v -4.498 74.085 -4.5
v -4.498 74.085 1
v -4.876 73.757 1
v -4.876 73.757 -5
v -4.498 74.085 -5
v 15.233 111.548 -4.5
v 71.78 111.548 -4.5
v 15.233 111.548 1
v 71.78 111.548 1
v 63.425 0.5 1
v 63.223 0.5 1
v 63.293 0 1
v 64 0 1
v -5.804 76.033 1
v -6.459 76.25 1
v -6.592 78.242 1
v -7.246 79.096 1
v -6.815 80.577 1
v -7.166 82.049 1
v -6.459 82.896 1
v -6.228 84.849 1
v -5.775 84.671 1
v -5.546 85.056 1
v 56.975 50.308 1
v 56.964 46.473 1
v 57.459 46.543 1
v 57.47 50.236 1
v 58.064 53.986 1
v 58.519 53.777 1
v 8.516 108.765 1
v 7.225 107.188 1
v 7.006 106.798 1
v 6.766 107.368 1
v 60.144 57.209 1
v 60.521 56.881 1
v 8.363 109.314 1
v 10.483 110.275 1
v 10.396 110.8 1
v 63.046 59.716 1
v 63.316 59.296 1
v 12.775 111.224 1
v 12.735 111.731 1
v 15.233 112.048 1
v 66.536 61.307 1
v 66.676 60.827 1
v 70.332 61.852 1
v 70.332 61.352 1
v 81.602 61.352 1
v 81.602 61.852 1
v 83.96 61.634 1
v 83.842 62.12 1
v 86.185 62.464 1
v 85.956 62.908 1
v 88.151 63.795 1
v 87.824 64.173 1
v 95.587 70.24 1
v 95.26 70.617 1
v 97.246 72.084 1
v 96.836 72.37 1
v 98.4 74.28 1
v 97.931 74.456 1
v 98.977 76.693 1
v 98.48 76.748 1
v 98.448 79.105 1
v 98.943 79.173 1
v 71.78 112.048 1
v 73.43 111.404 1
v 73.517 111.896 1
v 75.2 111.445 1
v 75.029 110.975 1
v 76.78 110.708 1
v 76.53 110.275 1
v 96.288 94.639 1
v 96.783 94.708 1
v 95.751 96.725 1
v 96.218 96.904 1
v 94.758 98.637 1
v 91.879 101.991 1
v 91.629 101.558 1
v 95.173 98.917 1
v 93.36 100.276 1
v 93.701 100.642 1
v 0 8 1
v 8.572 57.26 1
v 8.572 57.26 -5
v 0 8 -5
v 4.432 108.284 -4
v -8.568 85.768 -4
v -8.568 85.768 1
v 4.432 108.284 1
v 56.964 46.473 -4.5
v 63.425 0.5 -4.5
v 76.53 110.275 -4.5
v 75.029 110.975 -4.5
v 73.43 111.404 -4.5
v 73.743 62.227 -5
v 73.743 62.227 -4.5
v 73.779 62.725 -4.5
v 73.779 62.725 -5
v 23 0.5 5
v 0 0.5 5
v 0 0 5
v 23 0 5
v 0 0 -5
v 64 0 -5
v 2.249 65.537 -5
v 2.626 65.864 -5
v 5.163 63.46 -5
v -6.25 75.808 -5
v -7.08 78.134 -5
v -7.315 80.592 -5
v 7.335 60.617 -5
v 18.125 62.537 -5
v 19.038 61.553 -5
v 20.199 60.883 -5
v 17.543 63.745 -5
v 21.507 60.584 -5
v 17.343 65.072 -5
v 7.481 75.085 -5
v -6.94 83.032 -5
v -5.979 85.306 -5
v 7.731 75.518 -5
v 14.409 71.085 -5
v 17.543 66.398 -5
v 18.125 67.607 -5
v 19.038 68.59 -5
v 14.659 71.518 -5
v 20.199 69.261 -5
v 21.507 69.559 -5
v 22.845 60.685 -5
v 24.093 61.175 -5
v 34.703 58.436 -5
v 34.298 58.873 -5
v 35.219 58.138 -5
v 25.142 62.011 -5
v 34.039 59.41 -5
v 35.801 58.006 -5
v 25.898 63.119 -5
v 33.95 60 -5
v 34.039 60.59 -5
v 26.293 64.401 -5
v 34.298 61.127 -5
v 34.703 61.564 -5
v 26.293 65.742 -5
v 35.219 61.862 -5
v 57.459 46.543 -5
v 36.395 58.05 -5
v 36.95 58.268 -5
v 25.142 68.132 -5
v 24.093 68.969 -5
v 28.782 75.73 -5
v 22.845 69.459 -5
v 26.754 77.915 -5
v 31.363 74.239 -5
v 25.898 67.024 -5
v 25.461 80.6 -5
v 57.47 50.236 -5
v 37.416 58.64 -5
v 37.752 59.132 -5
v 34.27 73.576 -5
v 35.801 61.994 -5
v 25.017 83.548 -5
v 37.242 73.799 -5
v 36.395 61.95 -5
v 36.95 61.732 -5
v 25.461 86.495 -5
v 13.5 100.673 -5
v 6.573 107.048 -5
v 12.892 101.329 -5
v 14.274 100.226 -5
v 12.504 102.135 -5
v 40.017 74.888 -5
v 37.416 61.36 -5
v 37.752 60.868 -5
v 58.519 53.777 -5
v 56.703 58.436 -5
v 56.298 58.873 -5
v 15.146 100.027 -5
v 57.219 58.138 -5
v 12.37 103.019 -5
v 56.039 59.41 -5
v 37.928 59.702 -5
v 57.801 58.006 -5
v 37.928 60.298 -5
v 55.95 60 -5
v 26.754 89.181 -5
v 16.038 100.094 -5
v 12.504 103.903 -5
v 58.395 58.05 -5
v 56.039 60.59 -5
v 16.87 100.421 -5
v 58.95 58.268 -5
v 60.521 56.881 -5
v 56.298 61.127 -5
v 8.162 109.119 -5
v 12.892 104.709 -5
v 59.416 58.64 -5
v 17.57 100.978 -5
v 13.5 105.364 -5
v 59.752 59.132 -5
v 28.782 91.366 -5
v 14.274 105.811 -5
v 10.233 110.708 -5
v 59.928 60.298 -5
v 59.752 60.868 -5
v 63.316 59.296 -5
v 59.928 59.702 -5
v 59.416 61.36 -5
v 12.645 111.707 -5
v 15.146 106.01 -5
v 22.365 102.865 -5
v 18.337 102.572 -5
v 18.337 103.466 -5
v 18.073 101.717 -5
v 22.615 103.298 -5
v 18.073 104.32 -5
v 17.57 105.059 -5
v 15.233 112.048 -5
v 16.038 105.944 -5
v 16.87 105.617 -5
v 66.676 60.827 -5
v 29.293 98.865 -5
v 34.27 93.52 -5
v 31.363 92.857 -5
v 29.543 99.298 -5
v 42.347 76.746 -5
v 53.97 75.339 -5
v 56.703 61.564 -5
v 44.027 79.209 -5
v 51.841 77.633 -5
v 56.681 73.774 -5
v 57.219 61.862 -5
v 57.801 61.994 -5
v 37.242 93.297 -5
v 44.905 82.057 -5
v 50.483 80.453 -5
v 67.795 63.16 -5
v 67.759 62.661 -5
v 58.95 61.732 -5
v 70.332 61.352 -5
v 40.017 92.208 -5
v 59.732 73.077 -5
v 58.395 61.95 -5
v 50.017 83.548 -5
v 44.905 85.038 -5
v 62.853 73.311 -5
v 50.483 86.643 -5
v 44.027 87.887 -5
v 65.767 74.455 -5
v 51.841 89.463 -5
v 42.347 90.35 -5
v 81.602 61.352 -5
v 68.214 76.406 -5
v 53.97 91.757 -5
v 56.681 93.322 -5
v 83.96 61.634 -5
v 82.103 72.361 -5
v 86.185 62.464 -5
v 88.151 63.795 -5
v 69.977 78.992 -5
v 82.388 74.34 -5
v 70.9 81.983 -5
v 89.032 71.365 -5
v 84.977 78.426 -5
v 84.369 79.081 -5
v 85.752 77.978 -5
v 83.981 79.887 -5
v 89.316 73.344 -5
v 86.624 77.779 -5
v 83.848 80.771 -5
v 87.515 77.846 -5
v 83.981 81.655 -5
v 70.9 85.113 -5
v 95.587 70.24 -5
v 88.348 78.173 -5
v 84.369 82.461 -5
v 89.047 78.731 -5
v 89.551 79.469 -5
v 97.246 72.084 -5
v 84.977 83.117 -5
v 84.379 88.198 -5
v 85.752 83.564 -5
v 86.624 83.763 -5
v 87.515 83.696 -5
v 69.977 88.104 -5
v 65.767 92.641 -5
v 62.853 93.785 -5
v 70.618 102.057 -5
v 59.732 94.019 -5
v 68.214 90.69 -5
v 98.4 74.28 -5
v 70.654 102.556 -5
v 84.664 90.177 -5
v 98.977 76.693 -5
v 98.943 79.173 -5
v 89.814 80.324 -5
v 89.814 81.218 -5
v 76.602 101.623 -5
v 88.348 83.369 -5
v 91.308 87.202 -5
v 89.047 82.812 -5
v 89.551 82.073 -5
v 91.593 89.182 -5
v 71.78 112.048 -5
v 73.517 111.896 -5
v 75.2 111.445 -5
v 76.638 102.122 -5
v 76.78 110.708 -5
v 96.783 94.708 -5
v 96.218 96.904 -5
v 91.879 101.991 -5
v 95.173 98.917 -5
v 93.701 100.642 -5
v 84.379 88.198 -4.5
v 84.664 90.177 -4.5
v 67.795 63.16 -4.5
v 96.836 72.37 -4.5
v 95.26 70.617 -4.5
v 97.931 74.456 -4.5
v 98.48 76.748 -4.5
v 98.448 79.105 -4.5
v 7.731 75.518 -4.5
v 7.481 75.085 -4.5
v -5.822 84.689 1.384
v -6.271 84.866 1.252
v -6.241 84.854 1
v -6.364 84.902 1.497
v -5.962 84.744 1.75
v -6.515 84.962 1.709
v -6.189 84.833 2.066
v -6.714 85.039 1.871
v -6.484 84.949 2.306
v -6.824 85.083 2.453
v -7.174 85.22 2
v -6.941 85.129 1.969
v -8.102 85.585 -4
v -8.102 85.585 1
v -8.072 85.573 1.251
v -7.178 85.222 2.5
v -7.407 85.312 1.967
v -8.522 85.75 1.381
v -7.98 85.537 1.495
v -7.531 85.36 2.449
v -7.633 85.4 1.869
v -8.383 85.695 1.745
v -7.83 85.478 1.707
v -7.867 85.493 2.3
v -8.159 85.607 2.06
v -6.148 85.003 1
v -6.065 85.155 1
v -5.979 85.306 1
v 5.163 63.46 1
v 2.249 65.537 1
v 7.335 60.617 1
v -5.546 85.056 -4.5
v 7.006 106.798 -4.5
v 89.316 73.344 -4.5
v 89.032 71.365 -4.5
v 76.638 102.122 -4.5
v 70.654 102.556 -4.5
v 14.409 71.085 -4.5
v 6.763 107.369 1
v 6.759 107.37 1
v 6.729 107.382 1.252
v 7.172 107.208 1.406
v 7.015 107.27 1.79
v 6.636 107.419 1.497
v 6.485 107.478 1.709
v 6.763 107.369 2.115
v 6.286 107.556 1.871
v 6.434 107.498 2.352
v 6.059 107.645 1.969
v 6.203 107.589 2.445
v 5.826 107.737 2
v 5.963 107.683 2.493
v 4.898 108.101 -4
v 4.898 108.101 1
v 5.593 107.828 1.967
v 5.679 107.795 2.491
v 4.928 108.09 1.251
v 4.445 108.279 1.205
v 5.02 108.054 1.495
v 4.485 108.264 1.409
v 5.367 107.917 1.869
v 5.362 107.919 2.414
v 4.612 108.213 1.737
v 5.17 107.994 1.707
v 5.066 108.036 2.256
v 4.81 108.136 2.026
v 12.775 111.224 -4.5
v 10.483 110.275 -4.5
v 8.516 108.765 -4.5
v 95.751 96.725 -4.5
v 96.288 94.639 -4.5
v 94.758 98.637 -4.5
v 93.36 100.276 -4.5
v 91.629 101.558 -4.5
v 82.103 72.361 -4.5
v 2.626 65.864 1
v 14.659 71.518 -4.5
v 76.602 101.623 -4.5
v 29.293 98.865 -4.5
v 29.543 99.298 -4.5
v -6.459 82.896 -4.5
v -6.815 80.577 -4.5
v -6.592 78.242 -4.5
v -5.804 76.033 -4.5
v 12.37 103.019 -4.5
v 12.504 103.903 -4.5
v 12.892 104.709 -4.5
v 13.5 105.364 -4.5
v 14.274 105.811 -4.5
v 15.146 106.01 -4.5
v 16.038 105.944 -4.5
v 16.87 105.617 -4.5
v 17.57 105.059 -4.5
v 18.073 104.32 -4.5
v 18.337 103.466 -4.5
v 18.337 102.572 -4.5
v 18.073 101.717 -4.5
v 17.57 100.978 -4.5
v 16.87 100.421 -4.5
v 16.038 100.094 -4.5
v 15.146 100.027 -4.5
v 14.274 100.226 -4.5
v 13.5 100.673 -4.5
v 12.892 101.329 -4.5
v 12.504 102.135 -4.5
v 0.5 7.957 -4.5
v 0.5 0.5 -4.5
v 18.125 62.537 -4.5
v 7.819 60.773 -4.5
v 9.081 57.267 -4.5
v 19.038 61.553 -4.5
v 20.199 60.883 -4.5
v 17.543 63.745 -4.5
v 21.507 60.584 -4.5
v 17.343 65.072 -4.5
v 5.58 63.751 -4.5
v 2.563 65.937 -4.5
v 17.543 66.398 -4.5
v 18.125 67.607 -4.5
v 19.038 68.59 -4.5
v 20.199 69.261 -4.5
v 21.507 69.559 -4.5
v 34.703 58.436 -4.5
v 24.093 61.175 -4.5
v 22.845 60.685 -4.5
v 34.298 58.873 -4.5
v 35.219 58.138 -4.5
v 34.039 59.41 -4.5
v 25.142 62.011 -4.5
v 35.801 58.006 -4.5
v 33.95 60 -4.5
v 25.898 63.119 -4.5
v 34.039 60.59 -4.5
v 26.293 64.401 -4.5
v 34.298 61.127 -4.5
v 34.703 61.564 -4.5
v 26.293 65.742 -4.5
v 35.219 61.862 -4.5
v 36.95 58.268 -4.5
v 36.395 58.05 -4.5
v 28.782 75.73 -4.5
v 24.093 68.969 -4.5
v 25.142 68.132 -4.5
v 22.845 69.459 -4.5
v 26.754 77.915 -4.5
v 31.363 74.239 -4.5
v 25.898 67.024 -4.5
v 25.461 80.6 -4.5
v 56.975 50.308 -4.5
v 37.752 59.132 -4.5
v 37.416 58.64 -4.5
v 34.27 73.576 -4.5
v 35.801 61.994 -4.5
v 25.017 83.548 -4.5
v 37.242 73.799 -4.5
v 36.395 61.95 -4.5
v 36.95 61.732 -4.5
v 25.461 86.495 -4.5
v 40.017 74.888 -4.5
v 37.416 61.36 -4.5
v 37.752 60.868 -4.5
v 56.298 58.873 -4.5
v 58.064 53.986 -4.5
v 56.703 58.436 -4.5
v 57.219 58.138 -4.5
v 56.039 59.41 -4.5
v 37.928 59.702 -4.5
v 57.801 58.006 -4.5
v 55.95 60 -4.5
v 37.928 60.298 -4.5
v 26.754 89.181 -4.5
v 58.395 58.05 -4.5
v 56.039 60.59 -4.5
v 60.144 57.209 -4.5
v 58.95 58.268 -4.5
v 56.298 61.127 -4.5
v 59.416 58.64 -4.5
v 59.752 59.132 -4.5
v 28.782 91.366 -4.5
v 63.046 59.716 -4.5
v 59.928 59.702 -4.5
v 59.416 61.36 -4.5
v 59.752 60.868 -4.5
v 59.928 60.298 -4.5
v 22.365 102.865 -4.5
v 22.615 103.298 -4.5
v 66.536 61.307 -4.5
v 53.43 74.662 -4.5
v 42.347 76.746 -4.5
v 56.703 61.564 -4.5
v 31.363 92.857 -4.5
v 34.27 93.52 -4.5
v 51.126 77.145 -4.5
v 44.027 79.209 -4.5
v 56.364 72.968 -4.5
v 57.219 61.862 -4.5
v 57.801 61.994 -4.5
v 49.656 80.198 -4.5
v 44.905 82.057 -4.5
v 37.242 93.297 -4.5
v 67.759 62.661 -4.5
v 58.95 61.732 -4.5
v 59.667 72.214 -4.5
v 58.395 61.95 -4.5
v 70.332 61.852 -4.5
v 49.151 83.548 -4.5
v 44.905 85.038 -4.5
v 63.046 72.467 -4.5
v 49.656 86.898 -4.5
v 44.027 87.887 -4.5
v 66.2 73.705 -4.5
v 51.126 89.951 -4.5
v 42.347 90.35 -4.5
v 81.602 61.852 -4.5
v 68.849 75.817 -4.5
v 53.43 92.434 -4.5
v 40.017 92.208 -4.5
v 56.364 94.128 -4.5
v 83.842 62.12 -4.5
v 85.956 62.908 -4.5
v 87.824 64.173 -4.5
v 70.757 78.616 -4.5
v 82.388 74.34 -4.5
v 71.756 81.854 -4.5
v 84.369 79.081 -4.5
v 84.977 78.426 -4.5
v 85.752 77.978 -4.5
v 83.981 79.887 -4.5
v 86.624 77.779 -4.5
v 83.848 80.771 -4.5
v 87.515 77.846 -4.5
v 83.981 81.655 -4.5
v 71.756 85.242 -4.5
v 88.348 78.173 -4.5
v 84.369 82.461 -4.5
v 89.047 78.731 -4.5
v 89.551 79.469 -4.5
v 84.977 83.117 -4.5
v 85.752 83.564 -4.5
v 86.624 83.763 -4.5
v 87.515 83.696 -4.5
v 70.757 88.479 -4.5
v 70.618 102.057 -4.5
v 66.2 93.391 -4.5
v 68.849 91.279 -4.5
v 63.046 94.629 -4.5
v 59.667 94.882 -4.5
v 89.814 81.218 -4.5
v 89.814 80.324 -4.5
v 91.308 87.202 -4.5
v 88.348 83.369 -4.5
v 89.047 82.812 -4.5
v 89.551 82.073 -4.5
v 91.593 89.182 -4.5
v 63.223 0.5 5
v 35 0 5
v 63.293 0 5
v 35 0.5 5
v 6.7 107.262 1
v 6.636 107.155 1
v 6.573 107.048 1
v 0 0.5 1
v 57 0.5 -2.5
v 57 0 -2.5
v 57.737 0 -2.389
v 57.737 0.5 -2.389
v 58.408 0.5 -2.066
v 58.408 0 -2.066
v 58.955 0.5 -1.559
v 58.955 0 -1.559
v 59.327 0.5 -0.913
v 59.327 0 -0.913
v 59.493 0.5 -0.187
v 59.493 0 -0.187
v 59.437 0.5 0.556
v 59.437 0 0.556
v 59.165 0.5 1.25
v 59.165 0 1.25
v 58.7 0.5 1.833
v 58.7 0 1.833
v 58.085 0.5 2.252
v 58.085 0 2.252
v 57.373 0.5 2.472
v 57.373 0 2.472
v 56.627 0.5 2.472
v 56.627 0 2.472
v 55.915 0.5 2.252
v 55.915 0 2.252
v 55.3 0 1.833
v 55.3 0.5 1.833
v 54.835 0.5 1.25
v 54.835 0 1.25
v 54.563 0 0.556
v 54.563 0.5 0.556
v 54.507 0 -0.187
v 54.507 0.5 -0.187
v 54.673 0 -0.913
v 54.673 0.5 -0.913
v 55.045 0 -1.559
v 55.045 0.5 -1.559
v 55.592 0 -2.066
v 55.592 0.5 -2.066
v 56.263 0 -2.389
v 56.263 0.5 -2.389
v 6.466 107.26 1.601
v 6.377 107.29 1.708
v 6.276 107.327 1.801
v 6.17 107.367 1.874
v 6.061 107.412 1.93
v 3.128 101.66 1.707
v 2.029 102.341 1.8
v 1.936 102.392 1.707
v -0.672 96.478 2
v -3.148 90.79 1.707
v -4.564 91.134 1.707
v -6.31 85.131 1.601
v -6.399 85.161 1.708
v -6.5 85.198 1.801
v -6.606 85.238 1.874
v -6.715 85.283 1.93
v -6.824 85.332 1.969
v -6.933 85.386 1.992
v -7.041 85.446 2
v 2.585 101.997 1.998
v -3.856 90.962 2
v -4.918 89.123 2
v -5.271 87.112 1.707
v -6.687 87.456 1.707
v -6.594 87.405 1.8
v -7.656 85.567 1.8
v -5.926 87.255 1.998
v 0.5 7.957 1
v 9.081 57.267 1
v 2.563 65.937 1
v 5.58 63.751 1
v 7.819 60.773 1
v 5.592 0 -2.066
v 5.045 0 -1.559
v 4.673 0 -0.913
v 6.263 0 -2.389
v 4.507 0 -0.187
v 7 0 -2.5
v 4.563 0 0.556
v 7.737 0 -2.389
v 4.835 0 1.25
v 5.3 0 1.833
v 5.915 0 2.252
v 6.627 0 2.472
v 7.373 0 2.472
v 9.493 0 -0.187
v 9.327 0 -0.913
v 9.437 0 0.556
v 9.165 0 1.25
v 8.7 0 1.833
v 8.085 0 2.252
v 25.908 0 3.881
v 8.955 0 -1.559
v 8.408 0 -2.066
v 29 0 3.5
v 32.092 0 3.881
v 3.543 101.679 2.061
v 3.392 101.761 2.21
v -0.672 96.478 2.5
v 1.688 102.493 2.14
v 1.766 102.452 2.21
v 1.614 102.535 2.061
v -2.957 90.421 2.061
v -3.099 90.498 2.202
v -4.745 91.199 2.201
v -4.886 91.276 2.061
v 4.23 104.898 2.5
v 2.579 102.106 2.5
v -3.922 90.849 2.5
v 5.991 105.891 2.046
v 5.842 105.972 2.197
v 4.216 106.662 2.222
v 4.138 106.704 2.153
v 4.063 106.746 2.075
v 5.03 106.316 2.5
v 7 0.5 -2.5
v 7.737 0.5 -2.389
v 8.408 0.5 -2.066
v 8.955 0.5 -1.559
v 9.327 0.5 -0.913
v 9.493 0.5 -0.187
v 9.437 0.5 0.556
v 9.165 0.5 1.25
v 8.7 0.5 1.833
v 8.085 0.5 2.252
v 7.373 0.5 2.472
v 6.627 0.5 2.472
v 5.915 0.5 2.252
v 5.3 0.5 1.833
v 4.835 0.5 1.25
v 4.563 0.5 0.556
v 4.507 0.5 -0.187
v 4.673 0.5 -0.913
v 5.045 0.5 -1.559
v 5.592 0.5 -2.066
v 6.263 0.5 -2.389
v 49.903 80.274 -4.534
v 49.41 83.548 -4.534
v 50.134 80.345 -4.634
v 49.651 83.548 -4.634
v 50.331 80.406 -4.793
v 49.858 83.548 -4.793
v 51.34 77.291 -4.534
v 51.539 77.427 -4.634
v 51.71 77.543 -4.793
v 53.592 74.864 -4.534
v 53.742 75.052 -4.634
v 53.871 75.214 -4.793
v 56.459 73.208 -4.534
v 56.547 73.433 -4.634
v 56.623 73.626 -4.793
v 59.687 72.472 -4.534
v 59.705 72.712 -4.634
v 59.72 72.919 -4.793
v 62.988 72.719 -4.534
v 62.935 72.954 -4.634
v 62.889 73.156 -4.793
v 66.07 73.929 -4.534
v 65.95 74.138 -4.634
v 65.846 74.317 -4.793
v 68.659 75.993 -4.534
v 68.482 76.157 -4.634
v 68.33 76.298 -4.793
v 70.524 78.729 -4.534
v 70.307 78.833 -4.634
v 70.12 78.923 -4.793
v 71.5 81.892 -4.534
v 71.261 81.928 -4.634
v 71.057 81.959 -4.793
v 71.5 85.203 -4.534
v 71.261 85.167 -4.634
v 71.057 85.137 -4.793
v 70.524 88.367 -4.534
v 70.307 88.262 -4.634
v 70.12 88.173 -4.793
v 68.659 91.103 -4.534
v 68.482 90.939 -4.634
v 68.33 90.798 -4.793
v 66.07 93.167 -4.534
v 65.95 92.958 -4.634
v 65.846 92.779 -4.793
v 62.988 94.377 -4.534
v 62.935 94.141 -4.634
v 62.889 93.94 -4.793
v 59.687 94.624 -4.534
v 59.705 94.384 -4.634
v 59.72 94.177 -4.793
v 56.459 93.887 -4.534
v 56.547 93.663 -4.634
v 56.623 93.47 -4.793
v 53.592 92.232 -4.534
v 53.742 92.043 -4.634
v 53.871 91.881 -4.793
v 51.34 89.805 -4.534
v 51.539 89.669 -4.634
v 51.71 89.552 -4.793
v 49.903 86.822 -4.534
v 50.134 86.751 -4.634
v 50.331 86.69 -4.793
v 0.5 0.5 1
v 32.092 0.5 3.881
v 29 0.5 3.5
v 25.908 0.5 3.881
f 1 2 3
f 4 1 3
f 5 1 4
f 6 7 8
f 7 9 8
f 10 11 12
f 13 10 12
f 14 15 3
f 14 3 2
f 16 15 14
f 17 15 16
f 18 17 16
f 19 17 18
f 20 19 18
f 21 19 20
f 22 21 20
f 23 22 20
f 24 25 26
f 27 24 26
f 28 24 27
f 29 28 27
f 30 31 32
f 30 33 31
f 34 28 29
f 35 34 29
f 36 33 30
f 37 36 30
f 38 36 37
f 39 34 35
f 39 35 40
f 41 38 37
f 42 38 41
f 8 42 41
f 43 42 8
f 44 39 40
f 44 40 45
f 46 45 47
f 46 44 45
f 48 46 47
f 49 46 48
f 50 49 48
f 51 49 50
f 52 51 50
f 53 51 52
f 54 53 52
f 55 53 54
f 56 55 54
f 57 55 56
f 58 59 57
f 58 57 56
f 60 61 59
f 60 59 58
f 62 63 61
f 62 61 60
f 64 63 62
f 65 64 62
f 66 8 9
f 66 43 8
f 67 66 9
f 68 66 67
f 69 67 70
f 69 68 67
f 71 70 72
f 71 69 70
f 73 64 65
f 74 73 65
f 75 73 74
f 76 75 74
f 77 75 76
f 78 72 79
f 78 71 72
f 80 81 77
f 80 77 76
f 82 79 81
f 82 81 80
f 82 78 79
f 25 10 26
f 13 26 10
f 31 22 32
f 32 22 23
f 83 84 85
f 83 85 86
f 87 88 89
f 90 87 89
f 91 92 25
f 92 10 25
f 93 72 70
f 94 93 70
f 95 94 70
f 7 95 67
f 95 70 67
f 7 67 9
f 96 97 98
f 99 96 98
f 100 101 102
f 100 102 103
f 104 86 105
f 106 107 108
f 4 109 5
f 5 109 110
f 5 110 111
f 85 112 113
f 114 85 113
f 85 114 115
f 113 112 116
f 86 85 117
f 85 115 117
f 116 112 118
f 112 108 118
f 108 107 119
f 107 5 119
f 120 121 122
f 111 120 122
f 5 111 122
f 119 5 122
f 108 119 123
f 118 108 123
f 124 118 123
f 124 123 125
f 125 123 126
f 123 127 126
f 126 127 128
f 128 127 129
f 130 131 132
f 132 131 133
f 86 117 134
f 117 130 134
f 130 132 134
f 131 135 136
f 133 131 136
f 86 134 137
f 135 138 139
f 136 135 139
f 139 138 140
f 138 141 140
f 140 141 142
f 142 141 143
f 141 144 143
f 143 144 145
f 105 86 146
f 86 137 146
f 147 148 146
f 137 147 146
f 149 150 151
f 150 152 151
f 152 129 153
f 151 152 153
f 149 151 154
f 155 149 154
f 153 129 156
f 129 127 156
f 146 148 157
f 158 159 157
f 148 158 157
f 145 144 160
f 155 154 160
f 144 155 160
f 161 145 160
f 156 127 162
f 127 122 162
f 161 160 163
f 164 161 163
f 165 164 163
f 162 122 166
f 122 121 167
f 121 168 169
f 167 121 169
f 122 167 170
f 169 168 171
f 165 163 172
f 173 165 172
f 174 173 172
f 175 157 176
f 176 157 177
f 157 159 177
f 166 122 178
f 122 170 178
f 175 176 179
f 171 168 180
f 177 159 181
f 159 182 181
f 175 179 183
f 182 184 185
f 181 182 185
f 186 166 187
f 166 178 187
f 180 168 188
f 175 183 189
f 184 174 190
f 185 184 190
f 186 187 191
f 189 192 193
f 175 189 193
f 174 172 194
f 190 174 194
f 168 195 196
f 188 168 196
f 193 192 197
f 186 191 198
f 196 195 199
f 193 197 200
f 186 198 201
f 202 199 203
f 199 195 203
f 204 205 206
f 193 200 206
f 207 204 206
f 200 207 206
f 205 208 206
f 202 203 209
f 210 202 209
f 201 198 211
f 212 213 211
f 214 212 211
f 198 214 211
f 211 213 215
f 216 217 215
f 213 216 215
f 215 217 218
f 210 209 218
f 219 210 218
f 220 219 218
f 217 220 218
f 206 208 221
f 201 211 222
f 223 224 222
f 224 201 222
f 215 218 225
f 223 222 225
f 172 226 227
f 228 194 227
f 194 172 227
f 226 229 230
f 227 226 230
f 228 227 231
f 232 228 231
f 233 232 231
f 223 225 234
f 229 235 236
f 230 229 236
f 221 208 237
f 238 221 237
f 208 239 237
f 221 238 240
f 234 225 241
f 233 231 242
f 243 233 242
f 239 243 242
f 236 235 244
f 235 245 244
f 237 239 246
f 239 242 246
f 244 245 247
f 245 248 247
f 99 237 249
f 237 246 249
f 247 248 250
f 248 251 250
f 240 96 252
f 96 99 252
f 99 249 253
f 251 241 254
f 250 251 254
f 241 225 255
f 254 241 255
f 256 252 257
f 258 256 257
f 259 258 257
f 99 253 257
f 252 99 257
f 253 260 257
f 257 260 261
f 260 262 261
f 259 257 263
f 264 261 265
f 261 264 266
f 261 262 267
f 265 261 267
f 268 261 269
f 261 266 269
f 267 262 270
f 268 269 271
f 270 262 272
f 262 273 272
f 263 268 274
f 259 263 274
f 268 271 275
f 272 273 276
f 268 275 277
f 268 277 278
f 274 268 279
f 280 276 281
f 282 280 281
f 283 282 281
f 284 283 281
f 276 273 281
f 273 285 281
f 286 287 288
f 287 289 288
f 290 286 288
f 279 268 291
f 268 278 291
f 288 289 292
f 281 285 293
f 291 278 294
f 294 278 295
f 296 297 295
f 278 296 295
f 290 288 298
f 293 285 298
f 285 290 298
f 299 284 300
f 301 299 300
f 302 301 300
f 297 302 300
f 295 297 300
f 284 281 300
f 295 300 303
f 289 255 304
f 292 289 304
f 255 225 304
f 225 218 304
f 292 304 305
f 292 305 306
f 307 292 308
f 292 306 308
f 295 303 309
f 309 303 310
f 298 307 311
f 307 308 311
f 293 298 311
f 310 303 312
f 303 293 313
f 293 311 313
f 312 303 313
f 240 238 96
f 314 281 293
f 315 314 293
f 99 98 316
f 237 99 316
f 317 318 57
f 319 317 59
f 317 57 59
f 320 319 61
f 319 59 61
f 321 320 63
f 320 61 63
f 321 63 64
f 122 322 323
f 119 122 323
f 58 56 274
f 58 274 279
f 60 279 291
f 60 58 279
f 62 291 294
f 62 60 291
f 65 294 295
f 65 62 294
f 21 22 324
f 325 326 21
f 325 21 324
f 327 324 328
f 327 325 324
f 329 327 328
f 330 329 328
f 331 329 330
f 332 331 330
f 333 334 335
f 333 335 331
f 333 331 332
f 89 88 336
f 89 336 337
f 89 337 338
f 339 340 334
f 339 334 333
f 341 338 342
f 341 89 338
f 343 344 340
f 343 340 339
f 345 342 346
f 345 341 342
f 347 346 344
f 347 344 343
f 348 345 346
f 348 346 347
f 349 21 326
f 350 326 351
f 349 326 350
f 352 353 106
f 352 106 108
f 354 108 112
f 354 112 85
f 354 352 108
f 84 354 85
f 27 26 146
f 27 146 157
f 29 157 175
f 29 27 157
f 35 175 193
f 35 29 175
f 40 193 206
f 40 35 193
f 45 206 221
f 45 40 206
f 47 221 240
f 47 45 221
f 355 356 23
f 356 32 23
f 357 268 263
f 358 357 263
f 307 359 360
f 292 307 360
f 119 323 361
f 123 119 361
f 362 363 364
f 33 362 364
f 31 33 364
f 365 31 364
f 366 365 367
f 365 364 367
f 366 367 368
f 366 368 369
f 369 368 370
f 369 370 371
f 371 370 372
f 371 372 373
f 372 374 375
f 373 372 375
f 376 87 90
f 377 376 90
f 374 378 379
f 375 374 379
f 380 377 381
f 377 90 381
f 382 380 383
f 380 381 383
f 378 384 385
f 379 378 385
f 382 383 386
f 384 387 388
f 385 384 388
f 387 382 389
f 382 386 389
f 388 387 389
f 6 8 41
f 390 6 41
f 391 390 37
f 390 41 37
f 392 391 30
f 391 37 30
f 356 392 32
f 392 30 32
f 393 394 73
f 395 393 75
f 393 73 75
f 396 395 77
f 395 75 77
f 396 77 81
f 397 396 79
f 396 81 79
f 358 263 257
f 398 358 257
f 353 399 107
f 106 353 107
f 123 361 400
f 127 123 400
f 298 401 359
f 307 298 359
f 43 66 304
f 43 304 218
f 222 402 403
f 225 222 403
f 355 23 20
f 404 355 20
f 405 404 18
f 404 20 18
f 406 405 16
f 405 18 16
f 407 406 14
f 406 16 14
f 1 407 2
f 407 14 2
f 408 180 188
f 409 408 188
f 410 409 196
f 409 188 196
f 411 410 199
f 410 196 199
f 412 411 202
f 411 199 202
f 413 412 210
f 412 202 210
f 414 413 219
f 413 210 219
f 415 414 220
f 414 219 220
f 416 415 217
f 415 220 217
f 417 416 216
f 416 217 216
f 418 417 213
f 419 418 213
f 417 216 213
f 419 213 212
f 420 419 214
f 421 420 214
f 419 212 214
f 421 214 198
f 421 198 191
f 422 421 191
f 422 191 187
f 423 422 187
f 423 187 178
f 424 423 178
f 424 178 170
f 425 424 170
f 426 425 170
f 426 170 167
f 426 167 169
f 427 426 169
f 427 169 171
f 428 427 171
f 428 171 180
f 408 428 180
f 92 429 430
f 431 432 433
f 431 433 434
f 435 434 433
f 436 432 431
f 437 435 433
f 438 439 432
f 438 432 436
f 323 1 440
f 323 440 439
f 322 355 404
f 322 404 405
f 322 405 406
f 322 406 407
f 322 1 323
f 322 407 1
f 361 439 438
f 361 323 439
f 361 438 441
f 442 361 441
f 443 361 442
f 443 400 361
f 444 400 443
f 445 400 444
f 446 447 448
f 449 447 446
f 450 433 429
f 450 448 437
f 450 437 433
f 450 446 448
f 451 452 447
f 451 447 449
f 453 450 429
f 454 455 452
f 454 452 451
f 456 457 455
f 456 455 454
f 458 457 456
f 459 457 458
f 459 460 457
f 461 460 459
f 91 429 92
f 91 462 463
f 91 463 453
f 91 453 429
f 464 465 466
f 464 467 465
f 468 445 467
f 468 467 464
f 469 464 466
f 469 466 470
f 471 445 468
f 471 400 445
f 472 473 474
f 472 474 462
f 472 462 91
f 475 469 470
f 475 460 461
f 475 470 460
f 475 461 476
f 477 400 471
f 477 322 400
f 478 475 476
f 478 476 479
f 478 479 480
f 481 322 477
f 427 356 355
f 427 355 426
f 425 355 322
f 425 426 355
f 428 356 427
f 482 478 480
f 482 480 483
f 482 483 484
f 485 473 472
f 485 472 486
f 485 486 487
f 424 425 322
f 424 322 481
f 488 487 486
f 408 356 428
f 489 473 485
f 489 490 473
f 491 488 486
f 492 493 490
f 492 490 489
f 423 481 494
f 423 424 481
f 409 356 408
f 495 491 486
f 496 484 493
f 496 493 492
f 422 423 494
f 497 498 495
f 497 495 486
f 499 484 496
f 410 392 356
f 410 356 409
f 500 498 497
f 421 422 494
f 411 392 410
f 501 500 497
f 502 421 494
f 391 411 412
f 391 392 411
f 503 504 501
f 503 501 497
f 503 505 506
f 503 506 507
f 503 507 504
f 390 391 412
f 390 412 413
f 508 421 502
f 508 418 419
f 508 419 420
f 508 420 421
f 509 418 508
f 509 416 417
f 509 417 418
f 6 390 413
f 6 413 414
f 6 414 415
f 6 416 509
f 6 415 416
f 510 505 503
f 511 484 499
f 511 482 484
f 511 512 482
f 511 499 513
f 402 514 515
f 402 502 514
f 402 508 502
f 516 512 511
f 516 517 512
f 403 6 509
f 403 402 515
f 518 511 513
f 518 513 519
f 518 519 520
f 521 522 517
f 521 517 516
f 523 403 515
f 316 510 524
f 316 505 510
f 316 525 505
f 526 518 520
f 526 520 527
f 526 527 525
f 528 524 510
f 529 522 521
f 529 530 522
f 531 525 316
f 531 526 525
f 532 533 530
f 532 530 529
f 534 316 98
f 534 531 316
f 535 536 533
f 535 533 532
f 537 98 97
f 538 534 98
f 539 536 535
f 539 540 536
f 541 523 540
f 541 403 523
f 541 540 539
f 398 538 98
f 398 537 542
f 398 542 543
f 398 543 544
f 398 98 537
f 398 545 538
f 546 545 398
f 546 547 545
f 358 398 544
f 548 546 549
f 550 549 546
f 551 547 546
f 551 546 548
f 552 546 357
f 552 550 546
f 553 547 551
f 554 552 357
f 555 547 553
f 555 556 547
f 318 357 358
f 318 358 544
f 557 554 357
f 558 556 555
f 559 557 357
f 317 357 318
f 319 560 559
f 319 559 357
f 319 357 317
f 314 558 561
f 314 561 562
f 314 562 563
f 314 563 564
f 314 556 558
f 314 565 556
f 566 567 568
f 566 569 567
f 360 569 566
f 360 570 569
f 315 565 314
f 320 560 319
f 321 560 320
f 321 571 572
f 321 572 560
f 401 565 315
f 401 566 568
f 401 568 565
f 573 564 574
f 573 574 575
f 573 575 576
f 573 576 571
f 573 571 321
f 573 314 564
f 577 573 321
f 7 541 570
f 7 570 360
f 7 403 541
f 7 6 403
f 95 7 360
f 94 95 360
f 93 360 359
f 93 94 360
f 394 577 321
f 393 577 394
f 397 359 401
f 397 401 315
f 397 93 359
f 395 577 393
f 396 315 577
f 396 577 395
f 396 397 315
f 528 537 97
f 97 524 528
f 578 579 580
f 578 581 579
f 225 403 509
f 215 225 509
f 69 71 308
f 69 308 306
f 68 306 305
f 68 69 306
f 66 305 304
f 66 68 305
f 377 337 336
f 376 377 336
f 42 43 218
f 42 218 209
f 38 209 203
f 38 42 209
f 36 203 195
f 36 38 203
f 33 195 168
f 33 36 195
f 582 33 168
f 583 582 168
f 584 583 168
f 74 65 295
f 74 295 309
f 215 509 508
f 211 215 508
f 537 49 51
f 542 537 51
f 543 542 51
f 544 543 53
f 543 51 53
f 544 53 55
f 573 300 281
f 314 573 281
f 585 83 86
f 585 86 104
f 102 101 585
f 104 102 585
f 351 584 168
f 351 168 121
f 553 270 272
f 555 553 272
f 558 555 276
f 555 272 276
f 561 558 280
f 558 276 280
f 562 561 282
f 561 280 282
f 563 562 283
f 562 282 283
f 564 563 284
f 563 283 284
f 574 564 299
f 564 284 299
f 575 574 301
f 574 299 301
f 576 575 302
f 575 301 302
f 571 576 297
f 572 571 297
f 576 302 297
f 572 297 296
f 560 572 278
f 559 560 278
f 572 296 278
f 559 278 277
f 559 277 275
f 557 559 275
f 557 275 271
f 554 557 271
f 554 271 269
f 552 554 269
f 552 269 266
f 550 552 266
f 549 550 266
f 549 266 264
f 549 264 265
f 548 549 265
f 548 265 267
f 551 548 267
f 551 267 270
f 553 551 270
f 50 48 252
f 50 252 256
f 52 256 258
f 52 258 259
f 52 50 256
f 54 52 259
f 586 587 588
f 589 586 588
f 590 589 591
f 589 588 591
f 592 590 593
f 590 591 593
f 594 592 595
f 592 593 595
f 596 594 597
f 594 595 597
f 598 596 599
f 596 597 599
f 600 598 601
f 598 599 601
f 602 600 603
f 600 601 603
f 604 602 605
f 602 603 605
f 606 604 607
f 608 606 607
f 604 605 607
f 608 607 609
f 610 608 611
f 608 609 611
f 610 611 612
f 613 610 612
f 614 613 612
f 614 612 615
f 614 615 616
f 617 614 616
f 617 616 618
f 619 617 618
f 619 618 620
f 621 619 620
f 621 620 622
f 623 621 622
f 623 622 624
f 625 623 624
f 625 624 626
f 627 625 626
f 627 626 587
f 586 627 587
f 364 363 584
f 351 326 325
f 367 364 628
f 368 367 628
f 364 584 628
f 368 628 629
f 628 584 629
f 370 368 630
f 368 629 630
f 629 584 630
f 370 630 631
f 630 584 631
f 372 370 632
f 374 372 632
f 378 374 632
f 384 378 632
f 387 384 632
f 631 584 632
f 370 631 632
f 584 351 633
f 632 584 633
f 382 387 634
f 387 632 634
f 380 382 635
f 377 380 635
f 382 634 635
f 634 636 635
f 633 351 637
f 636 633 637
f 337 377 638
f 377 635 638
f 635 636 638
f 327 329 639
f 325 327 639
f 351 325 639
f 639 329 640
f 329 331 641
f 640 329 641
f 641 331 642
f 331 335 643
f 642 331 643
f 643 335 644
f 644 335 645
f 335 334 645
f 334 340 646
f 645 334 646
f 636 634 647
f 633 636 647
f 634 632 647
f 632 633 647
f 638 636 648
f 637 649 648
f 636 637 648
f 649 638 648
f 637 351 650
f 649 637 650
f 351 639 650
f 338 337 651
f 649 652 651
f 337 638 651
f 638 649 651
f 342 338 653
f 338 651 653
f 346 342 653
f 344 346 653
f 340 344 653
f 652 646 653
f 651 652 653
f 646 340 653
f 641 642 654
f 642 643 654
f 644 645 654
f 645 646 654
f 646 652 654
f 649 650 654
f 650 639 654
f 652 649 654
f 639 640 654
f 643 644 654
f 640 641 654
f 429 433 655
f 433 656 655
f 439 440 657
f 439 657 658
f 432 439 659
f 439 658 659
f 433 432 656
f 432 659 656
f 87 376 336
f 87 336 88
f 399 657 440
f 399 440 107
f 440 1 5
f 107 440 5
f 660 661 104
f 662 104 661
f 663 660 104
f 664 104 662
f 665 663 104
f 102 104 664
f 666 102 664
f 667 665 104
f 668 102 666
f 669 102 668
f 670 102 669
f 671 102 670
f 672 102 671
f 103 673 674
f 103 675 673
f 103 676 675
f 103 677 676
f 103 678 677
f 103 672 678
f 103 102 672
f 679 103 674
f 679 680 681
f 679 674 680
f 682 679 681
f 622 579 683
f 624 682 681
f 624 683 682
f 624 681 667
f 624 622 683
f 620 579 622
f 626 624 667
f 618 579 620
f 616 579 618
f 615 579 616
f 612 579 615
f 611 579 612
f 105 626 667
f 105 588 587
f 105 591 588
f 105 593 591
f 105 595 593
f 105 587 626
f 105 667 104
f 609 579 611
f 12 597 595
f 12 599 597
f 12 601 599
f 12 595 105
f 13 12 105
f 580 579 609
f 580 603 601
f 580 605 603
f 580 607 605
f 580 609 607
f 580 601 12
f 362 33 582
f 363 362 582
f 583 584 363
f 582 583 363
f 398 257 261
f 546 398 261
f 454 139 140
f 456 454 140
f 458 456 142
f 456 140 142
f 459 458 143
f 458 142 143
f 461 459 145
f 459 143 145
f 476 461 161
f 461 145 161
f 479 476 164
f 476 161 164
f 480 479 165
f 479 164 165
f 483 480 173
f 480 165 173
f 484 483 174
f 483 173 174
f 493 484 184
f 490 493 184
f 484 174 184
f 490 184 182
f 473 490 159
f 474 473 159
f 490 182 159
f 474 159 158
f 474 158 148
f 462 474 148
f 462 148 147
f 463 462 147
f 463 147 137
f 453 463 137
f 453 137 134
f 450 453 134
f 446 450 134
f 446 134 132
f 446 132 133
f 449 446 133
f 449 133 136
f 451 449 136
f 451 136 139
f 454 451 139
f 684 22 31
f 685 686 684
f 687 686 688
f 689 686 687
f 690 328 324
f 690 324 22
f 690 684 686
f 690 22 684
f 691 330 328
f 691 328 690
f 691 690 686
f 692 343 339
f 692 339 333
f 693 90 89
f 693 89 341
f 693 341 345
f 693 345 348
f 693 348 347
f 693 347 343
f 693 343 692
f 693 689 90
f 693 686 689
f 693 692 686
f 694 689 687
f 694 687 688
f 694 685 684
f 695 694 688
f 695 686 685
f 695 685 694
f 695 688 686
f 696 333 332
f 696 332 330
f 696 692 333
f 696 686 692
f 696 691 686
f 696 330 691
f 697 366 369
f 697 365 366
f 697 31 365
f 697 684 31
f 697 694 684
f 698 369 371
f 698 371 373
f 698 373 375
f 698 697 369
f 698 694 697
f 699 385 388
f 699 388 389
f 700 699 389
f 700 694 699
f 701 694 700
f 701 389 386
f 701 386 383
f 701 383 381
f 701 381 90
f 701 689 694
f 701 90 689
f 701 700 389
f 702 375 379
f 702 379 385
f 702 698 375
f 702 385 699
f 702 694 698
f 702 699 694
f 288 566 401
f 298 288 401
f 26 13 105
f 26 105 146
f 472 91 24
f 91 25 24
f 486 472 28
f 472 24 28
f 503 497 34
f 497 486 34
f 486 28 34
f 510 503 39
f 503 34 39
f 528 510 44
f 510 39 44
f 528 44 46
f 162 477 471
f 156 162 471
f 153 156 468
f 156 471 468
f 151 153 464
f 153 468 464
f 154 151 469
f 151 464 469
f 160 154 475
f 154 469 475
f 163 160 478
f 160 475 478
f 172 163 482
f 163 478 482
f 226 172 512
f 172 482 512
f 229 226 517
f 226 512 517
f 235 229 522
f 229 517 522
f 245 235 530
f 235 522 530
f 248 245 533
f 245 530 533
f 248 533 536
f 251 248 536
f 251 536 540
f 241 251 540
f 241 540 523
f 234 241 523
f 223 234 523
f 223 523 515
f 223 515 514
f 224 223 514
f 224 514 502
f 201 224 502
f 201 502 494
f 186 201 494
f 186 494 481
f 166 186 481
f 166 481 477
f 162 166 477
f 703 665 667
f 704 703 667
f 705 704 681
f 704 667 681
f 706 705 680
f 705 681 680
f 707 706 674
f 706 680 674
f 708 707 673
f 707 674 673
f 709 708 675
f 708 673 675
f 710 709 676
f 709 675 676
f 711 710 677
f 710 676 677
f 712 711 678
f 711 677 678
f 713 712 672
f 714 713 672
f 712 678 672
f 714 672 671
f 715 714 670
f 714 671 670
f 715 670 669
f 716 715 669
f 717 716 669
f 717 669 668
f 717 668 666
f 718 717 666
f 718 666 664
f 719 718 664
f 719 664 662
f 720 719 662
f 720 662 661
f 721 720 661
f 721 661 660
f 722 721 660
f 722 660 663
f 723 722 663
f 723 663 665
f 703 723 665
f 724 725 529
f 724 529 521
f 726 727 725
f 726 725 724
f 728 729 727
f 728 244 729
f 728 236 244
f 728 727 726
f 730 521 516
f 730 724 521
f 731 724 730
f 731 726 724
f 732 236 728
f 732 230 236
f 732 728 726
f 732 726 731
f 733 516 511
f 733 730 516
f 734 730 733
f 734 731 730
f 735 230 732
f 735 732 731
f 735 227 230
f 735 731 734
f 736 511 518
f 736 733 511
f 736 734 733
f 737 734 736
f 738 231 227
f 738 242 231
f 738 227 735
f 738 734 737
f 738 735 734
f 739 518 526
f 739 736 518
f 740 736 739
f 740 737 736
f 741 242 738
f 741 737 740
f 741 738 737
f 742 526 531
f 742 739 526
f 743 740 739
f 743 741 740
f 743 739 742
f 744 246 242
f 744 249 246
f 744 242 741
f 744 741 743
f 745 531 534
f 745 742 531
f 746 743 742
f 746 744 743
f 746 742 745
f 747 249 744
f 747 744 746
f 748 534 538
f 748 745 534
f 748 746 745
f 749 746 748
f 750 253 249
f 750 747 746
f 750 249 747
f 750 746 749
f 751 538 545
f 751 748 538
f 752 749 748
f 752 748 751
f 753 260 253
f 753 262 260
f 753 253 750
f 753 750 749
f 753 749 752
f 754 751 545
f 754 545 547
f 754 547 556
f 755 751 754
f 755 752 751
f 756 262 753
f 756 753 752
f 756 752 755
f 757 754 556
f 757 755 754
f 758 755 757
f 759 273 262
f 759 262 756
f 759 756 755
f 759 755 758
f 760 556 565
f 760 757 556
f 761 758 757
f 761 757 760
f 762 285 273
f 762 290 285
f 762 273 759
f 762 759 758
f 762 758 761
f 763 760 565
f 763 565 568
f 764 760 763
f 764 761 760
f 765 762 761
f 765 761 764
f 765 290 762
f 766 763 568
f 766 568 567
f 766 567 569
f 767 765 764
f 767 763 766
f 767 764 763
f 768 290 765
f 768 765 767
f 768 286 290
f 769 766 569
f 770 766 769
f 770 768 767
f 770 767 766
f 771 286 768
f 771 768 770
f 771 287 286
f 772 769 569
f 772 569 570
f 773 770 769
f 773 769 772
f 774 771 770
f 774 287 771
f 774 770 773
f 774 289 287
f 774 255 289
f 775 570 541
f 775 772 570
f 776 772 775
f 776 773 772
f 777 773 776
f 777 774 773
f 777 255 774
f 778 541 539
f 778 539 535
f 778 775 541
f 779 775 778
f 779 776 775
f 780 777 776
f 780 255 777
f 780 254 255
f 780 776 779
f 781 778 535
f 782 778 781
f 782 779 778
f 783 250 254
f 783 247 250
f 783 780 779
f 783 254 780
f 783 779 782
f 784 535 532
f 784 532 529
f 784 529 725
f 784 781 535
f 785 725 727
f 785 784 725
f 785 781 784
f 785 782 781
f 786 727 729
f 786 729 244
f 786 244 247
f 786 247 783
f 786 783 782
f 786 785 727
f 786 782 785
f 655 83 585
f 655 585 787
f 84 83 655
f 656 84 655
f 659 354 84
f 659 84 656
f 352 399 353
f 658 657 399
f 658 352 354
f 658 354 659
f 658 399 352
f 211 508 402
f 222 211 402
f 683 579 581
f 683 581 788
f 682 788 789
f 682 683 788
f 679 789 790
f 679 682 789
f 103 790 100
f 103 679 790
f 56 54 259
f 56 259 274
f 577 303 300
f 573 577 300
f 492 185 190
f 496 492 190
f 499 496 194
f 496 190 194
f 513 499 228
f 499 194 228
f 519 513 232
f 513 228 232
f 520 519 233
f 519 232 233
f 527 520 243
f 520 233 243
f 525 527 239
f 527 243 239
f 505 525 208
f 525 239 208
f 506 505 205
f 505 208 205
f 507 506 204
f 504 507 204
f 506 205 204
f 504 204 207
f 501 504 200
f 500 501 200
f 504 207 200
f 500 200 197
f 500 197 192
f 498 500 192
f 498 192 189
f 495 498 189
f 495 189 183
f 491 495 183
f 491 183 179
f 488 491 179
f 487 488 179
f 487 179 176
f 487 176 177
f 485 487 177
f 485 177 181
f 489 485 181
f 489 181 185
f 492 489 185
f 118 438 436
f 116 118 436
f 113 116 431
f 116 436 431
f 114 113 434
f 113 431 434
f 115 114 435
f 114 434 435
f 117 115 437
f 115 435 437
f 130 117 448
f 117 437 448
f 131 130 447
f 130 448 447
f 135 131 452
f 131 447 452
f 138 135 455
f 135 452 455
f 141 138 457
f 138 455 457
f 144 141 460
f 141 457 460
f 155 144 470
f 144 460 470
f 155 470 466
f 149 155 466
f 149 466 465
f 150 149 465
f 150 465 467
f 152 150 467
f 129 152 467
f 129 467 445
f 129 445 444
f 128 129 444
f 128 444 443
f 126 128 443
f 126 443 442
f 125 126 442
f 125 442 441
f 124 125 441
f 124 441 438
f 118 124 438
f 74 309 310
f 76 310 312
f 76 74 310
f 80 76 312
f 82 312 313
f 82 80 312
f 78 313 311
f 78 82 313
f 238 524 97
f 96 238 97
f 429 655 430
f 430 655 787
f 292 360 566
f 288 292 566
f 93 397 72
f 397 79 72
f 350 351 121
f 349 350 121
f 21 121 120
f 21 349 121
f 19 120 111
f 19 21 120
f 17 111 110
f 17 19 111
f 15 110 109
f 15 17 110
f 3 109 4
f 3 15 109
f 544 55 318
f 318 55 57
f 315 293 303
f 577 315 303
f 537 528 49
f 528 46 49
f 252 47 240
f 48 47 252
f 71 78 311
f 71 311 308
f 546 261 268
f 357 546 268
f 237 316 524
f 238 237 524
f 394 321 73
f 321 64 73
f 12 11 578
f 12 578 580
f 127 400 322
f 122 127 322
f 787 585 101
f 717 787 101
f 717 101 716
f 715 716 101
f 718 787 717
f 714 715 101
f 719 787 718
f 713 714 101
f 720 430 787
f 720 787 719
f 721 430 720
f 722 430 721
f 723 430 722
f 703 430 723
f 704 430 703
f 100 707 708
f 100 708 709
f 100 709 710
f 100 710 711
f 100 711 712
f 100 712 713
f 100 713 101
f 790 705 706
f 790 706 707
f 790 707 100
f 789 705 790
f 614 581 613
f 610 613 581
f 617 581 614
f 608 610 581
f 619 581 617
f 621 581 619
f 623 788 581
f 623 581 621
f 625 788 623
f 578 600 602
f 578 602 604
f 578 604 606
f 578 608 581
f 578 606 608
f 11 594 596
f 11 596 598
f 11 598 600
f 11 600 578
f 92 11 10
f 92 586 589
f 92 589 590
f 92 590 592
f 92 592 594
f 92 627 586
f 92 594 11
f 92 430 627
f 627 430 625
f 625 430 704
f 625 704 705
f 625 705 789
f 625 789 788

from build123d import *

# Parameters (mm, degrees)
BOSS_EXTRUDE1_DEPTH         = 5
SHELL1_T                    = -0.5
SKETCH4_R                   = 2.5
CUT_EXTRUDE4_DEPTH          = 10
CUT_SWEEP2_START            = 1
CUT_SWEEP2_DEPTH            = 4
SKETCH8_W                   = 6
SKETCH8_H                   = 10.878336181
CUT_EXTRUDE6_DEPTH          = 10
SKETCH11_R                  = 4.5
SKETCH11_R_2                = 10.5
SKETCH11_R_3                = 10
CUT_EXTRUDE7_DEPTH          = 150.877510373
FILLET1_R                   = 1
BOSS_EXTRUDE6_START         = 69.993050043
BOSS_EXTRUDE6_DEPTH         = 26.446393474
BOSS_EXTRUDE6_START_2       = -40
BOSS_EXTRUDE6_2_OUTLINE_W   = 1.69894254
BOSS_EXTRUDE6_2_OUTLINE_H   = 3
BOSS_EXTRUDE6_2_OUTLINE_W_2 = 1.590498846
BOSS_EXTRUDE6_2_OUTLINE_H_2 = 10
BOSS_EXTRUDE6_2_DEPTH       = 7.043773978
BOSS_EXTRUDE6_3_OUTLINE_W   = 1.69894254
BOSS_EXTRUDE6_3_OUTLINE_H   = 7
BOSS_EXTRUDE6_3_DEPTH       = 3.122658049
BOSS_EXTRUDE6_START_3       = -33.015543653
BOSS_EXTRUDE6_4_OUTLINE_W   = 1.590498846
BOSS_EXTRUDE6_4_OUTLINE_H   = 3
BOSS_EXTRUDE6_4_DEPTH       = 2.015543653
SKETCH17_R                  = 3
CUT_EXTRUDE8_DEPTH          = 10
CUT_EXTRUDE9_DEPTH          = 10
SKETCH19_R                  = 2
CUT_EXTRUDE10_DEPTH         = 150.877510373
CUT_EXTRUDE11_DEPTH         = 10


with BuildPart() as part:
    # Sketch1 → Boss-Extrude1 (new, symmetric)
    with BuildSketch(Plane.XY):
        with BuildLine():
            Line((0, 0), (64, 0))
            Line((64, 0), (57.458864255, 46.542599231))
            ThreePointArc((57.458864255, 46.542599231), (60.521124606, 56.88061692), (70.332349149, 61.351849543))
            Line((70.332349149, 61.351849543), (81.602015886, 61.351849543))
            ThreePointArc((81.602015886, 61.351849543), (85.0970904, 61.9825137), (88.15132127, 63.794958715))
            Line((88.15132127, 63.794958715), (95.587384775, 70.239547086))
            ThreePointArc((95.587384775, 70.239547086), (98.399557697, 74.280371374), (98.942828678, 79.173369852))
            Line((98.942828678, 79.173369852), (96.783267224, 94.707844854))
            ThreePointArc((96.783267224, 94.707844854), (95.173069343, 98.916646259), (91.878517937, 101.991166954))
            Line((91.878517937, 101.991166954), (76.780291664, 110.708131957))
            ThreePointArc((76.780291664, 110.708131957), (74.368482115, 111.707136182), (71.780291664, 112.047877919))
            Line((71.780291664, 112.047877919), (15.23328628, 112.047877919))
            ThreePointArc((15.23328628, 112.047877919), (10.23328628, 110.708131957), (6.573032242, 107.047877919))
            Line((6.573032242, 107.047877919), (-5.979384502, 85.30645436))
            ThreePointArc((-5.979384502, 85.30645436), (-7.273805779, 79.355434178), (-4.876021292, 73.757148976))
            Line((-4.876021292, 73.757148976), (2.24853328, 65.536509085))
            ThreePointArc((2.24853328, 65.536509085), (6.355355668, 62.120008219), (8.572429973, 57.259653311))
            Line((8.572429973, 57.259653311), (0, 8))
            Line((0, 8), (0, 0))
        make_face()
    extrude(amount=BOSS_EXTRUDE1_DEPTH, both=True)

    # Shell1
    shell1_openings = [part.faces().sort_by_distance(p)[0] for p in [
        (40.493150865, 62.038987827, 5),
    ]]
    offset(amount=SHELL1_T, openings=shell1_openings, kind=Kind.INTERSECTION)

    # Sketch4 → Cut-Extrude4 (cut)
    with BuildSketch(Plane.XZ):
        with Locations(Location((7, 0, 0), (0, 0, 270))):
            Circle(SKETCH4_R)
        with Locations(Location((57, 0, 0), (0, 0, 270))):
            Circle(SKETCH4_R)
        with BuildLine():
            Line((23, 5), (35, 5))
            ThreePointArc((35, 5), (29, 3.5), (23, 5))
        make_face()
    extrude(amount=-CUT_EXTRUDE4_DEPTH, mode=Mode.SUBTRACT)

    # Cut-Sweep2: read off the stored shape, not the designer's step
    # Cut-Sweep2 outline → Cut-Sweep2 (cut)
    with BuildSketch(Plane.XY.offset(CUT_SWEEP2_START)):
        with BuildLine():
            Line((63.222895016, 0.5), (63.293165433, 0))
            Line((63.293165433, 0), (64, 0))
            Line((64, 0), (57.458864255, 46.542599231))
            ThreePointArc((57.458864255, 46.542599231), (60.521124606, 56.88061692), (70.332349149, 61.351849543))
            Line((70.332349149, 61.351849543), (81.602015886, 61.351849543))
            ThreePointArc((81.602015886, 61.351849543), (85.0970904, 61.9825137), (88.15132127, 63.794958715))
            Line((88.15132127, 63.794958715), (95.587384775, 70.239547086))
            ThreePointArc((95.587384775, 70.239547086), (98.399557697, 74.280371374), (98.942828678, 79.173369852))
            Line((98.942828678, 79.173369852), (96.783267224, 94.707844854))
            ThreePointArc((96.783267224, 94.707844854), (95.173069343, 98.916646258), (91.878517937, 101.991166954))
            Line((91.878517937, 101.991166954), (76.780291664, 110.708131957))
            ThreePointArc((76.780291664, 110.708131957), (74.368482115, 111.707136182), (71.780291664, 112.047877919))
            Line((71.780291664, 112.047877919), (15.23328628, 112.047877919))
            ThreePointArc((15.23328628, 112.047877919), (10.23328628, 110.708131957), (6.573032242, 107.047877919))
            Line((6.573032242, 107.047877919), (-5.979384502, 85.30645436))
            ThreePointArc((-5.979384502, 85.30645436), (-7.273805779, 79.355434178), (-4.876021292, 73.757148976))
            Line((-4.876021292, 73.757148976), (2.24853328, 65.536509085))
            ThreePointArc((2.24853328, 65.536509085), (6.355355668, 62.120008219), (8.572429973, 57.259653311))
            Line((8.572429973, 57.259653311), (0, 8))
            Line((0, 8), (0, 0.5))
            Line((0, 0.5), (0.5, 0.5))
            Line((0.5, 0.5), (0.5, 7.956818155))
            Line((0.5, 7.956818155), (9.081153751, 57.266600812))
            ThreePointArc((9.081153751, 57.266600812), (6.811556982, 62.345857113), (2.562843108, 65.937283639))
            Line((2.562843108, 65.937283639), (-4.498176751, 74.084614245))
            ThreePointArc((-4.498176751, 74.084614245), (-6.776072013, 79.402985187), (-5.5463718, 85.05645436))
            Line((-5.5463718, 85.05645436), (7.006044944, 106.797877919))
            ThreePointArc((7.006044944, 106.797877919), (10.48328628, 110.275119255), (15.23328628, 111.547877919))
            Line((15.23328628, 111.547877919), (71.780291664, 111.547877919))
            ThreePointArc((71.780291664, 111.547877919), (74.239072592, 111.224173269), (76.530291664, 110.275119255))
            Line((76.530291664, 110.275119255), (91.628517937, 101.558154252))
            ThreePointArc((91.628517937, 101.558154252), (94.758341773, 98.637359591), (96.28802976, 94.638998257))
            Line((96.28802976, 94.638998257), (98.447591213, 79.104523255))
            ThreePointArc((98.447591213, 79.104523255), (97.931483782, 74.456174701), (95.259919506, 70.617391628))
            Line((95.259919506, 70.617391628), (87.823856001, 64.172803257))
            ThreePointArc((87.823856001, 64.172803257), (84.922336675, 62.450980492), (81.602015886, 61.851849543))
            Line((81.602015886, 61.851849543), (70.332349149, 61.851849543))
            ThreePointArc((70.332349149, 61.851849543), (60.143769816, 57.208646435), (56.963730221, 46.47301268))
            Line((56.963730221, 46.47301268), (63.424815796, 0.5))
            Line((63.424815796, 0.5), (63.222895016, 0.5))
        make_face()
    extrude(amount=CUT_SWEEP2_DEPTH, mode=Mode.SUBTRACT)

    # Sketch8 → Cut-Extrude6 (cut)
    with BuildSketch(Plane(origin=(34.097487332, 29.551155688, 0), x_dir=(0, 0, -1), z_dir=(0.7556890827898172, 0.6549305384178423, 0))):
        with Locations((2, 53.491759419)):
            Rectangle(SKETCH8_W, SKETCH8_H)
    extrude(amount=-CUT_EXTRUDE6_DEPTH, mode=Mode.SUBTRACT)

    # Sketch11 → Cut-Extrude7 (cut, through all)
    with BuildSketch(Plane.XY.offset(5)):
        with Locations(Location((21.843413851, 65.071690598, 0), (0, 0, 180))):
            Circle(SKETCH11_R)
        with Locations(Location((60.516838143, 83.547877919, 0), (0, 0, 180))):
            Circle(SKETCH11_R_2)
        with Locations(Location((35.016838143, 83.547877919, 0), (0, 0, 180))):
            Circle(SKETCH11_R_3)
    extrude(amount=-CUT_EXTRUDE7_DEPTH, mode=Mode.SUBTRACT)

    # Fillet1
    # the kernel refuses this fillet: 1 mm, written as the material it takes off along each edge
    with BuildSketch(Plane(origin=(60.516838143, 83.547877919, -4.5), x_dir=(-1, 0, 0), z_dir=(0, 1, 0))) as fillet1_piece_1:
        with BuildLine():
            CenterArc((11.366025404, -1), FILLET1_R, 90, 60)
            Line((11.366025404, 0), (11.366025404, 0.02))
            Line((11.366025404, 0.02), (10.5, 0.02))
            Line((10.5, 0.02), (10.48, 0))
            ThreePointArc((10.48, 0), (10.48, -0.25), (10.482679492, -0.49))
            Line((10.482679492, -0.49), (10.5, -0.5))
        make_face()
    revolve(axis=Axis((60.516838143, 83.547877919, -4.5), (0, 0, 1)), mode=Mode.SUBTRACT)

    # Boss-Extrude6: read off the stored shape, not the designer's step
    # Boss-Extrude6 outline → Boss-Extrude6 (add)
    with BuildSketch(Plane(origin=(0, 0, 0), x_dir=(0.8660254037844399, -0.4999999999999979, 0), z_dir=(0.4999999999999979, 0.8660254037844398, 0)).offset(BOSS_EXTRUDE6_START)):
        with BuildLine():
            add(Edge.make_bspline(
                [(-47.337092239, -1), (-47.337092239, -2.5), (-48.820393697, -2.5), (-50.303695156, -2.5), (-50.303695156, -1)],
                knots=[0, 0, 0, 1.570796327, 1.570796327, 3.141592654, 3.141592654, 3.141592654], degree=2, weights=[1, 0.707106781, 1, 0.707106781, 1]))
            Line((-47.337092239, -1), (-47.831526058, -1))
            add(Edge.make_bspline(
                [(-47.831526058, -1), (-47.831526058, -2), (-48.820393697, -2), (-49.809261336, -2), (-49.809261336, -1)],
                knots=[0, 0, 0, 1.570796327, 1.570796327, 3.141592654, 3.141592654, 3.141592654], degree=2, weights=[1, 0.707106781, 1, 0.707106781, 1]))
            Line((-49.809261336, -1), (-49.809261336, 4))
            Line((-49.809261336, 4), (-50.303695156, 4))
            Line((-50.303695156, 4), (-50.303695156, -1))
        make_face()
    extrude(amount=BOSS_EXTRUDE6_DEPTH)

    # Boss-Extrude6 2 outline → Boss-Extrude6 2 (cut)
    with BuildSketch(Plane(origin=(0, 0, 0), x_dir=(0.365571123575949, 0.9307834085368187, 0), z_dir=(0.9307834085368187, -0.36557112357594895, 0)).offset(BOSS_EXTRUDE6_START_2)):
        with Locations((75.84947127, 2.5)):
            Rectangle(BOSS_EXTRUDE6_2_OUTLINE_W, BOSS_EXTRUDE6_2_OUTLINE_H)
        with Locations((103.204750577, -1)):
            Rectangle(BOSS_EXTRUDE6_2_OUTLINE_W_2, BOSS_EXTRUDE6_2_OUTLINE_H_2)
    extrude(amount=BOSS_EXTRUDE6_2_DEPTH, mode=Mode.SUBTRACT)

    # Boss-Extrude6 3 outline → Boss-Extrude6 3 (cut)
    with BuildSketch(Plane(origin=(0, 0, 0), x_dir=(0.365571123575949, 0.9307834085368187, 0), z_dir=(0.9307834085368187, -0.36557112357594895, 0)).offset(BOSS_EXTRUDE6_START_2)):
        with Locations((75.84947127, -2.5)):
            Rectangle(BOSS_EXTRUDE6_3_OUTLINE_W, BOSS_EXTRUDE6_3_OUTLINE_H)
    extrude(amount=BOSS_EXTRUDE6_3_DEPTH, mode=Mode.SUBTRACT)

    # Boss-Extrude6 4 outline → Boss-Extrude6 4 (cut)
    with BuildSketch(Plane(origin=(0, 0, 0), x_dir=(0.365571123575949, 0.9307834085368187, 0), z_dir=(0.9307834085368187, -0.36557112357594895, 0)).offset(BOSS_EXTRUDE6_START_3)):
        with Locations((103.204750577, 2.5)):
            Rectangle(BOSS_EXTRUDE6_4_OUTLINE_W, BOSS_EXTRUDE6_4_OUTLINE_H)
    extrude(amount=BOSS_EXTRUDE6_4_DEPTH, mode=Mode.SUBTRACT)

    # Sketch17 → Cut-Extrude8 (cut)
    with BuildSketch(Plane(origin=(0, 0, -5), x_dir=(-1, 0, 0), z_dir=(0, 0, -1))):
        with Locations((-86.847845229, 80.771032583)):
            Circle(SKETCH17_R)
        with Locations((-15.370383265, 103.018842591)):
            Circle(SKETCH17_R)
    extrude(amount=-CUT_EXTRUDE8_DEPTH, mode=Mode.SUBTRACT)

    # Sketch18 → Cut-Extrude9 (cut)
    with BuildSketch(Plane.XY.offset(-4.5)):
        Polygon((67.794990984, 63.159599672), (67.758803504, 62.660910926), (73.743068466, 62.226661163), (73.779255946, 62.72534991), align=None)
        Polygon((76.601879403, 101.623072167), (76.638066884, 102.121760914), (70.653801921, 102.556010677), (70.617614441, 102.05732193), align=None)
        Polygon((22.614883225, 103.298241446), (22.364883225, 102.865228744), (29.293086455, 98.865228744), (29.543086455, 99.298241446), align=None)
        Polygon((14.659111859, 71.518441227), (7.730908628, 75.518441227), (7.480908628, 75.085428525), (14.409111859, 71.085428525), align=None)
    extrude(amount=-CUT_EXTRUDE9_DEPTH, mode=Mode.SUBTRACT)

    # Sketch19 → Cut-Extrude10 (cut, through all)
    with BuildSketch(Plane(origin=(0, 0, -5), x_dir=(-1, 0, 0), z_dir=(0, 0, -1))):
        with Locations((-57.950079932, 60)):
            Circle(SKETCH19_R)
        with Locations((-35.950079932, 60)):
            Circle(SKETCH19_R)
    extrude(amount=-CUT_EXTRUDE10_DEPTH, mode=Mode.SUBTRACT)

    # Sketch20 → Cut-Extrude11 (cut)
    with BuildSketch(Plane(origin=(0, 0, -5), x_dir=(-1, 0, 0), z_dir=(0, 0, -1))):
        Polygon((-91.592738232, 89.181501678), (-91.308182839, 87.201848115), (-84.379395369, 88.19779199), (-84.663950762, 90.177445553), align=None)
        Polygon((-89.316295089, 73.344273176), (-89.031739697, 71.364619614), (-82.102952227, 72.360563488), (-82.38750762, 74.340217051), align=None)
    extrude(amount=-CUT_EXTRUDE11_DEPTH, mode=Mode.SUBTRACT)


solid = part.part
